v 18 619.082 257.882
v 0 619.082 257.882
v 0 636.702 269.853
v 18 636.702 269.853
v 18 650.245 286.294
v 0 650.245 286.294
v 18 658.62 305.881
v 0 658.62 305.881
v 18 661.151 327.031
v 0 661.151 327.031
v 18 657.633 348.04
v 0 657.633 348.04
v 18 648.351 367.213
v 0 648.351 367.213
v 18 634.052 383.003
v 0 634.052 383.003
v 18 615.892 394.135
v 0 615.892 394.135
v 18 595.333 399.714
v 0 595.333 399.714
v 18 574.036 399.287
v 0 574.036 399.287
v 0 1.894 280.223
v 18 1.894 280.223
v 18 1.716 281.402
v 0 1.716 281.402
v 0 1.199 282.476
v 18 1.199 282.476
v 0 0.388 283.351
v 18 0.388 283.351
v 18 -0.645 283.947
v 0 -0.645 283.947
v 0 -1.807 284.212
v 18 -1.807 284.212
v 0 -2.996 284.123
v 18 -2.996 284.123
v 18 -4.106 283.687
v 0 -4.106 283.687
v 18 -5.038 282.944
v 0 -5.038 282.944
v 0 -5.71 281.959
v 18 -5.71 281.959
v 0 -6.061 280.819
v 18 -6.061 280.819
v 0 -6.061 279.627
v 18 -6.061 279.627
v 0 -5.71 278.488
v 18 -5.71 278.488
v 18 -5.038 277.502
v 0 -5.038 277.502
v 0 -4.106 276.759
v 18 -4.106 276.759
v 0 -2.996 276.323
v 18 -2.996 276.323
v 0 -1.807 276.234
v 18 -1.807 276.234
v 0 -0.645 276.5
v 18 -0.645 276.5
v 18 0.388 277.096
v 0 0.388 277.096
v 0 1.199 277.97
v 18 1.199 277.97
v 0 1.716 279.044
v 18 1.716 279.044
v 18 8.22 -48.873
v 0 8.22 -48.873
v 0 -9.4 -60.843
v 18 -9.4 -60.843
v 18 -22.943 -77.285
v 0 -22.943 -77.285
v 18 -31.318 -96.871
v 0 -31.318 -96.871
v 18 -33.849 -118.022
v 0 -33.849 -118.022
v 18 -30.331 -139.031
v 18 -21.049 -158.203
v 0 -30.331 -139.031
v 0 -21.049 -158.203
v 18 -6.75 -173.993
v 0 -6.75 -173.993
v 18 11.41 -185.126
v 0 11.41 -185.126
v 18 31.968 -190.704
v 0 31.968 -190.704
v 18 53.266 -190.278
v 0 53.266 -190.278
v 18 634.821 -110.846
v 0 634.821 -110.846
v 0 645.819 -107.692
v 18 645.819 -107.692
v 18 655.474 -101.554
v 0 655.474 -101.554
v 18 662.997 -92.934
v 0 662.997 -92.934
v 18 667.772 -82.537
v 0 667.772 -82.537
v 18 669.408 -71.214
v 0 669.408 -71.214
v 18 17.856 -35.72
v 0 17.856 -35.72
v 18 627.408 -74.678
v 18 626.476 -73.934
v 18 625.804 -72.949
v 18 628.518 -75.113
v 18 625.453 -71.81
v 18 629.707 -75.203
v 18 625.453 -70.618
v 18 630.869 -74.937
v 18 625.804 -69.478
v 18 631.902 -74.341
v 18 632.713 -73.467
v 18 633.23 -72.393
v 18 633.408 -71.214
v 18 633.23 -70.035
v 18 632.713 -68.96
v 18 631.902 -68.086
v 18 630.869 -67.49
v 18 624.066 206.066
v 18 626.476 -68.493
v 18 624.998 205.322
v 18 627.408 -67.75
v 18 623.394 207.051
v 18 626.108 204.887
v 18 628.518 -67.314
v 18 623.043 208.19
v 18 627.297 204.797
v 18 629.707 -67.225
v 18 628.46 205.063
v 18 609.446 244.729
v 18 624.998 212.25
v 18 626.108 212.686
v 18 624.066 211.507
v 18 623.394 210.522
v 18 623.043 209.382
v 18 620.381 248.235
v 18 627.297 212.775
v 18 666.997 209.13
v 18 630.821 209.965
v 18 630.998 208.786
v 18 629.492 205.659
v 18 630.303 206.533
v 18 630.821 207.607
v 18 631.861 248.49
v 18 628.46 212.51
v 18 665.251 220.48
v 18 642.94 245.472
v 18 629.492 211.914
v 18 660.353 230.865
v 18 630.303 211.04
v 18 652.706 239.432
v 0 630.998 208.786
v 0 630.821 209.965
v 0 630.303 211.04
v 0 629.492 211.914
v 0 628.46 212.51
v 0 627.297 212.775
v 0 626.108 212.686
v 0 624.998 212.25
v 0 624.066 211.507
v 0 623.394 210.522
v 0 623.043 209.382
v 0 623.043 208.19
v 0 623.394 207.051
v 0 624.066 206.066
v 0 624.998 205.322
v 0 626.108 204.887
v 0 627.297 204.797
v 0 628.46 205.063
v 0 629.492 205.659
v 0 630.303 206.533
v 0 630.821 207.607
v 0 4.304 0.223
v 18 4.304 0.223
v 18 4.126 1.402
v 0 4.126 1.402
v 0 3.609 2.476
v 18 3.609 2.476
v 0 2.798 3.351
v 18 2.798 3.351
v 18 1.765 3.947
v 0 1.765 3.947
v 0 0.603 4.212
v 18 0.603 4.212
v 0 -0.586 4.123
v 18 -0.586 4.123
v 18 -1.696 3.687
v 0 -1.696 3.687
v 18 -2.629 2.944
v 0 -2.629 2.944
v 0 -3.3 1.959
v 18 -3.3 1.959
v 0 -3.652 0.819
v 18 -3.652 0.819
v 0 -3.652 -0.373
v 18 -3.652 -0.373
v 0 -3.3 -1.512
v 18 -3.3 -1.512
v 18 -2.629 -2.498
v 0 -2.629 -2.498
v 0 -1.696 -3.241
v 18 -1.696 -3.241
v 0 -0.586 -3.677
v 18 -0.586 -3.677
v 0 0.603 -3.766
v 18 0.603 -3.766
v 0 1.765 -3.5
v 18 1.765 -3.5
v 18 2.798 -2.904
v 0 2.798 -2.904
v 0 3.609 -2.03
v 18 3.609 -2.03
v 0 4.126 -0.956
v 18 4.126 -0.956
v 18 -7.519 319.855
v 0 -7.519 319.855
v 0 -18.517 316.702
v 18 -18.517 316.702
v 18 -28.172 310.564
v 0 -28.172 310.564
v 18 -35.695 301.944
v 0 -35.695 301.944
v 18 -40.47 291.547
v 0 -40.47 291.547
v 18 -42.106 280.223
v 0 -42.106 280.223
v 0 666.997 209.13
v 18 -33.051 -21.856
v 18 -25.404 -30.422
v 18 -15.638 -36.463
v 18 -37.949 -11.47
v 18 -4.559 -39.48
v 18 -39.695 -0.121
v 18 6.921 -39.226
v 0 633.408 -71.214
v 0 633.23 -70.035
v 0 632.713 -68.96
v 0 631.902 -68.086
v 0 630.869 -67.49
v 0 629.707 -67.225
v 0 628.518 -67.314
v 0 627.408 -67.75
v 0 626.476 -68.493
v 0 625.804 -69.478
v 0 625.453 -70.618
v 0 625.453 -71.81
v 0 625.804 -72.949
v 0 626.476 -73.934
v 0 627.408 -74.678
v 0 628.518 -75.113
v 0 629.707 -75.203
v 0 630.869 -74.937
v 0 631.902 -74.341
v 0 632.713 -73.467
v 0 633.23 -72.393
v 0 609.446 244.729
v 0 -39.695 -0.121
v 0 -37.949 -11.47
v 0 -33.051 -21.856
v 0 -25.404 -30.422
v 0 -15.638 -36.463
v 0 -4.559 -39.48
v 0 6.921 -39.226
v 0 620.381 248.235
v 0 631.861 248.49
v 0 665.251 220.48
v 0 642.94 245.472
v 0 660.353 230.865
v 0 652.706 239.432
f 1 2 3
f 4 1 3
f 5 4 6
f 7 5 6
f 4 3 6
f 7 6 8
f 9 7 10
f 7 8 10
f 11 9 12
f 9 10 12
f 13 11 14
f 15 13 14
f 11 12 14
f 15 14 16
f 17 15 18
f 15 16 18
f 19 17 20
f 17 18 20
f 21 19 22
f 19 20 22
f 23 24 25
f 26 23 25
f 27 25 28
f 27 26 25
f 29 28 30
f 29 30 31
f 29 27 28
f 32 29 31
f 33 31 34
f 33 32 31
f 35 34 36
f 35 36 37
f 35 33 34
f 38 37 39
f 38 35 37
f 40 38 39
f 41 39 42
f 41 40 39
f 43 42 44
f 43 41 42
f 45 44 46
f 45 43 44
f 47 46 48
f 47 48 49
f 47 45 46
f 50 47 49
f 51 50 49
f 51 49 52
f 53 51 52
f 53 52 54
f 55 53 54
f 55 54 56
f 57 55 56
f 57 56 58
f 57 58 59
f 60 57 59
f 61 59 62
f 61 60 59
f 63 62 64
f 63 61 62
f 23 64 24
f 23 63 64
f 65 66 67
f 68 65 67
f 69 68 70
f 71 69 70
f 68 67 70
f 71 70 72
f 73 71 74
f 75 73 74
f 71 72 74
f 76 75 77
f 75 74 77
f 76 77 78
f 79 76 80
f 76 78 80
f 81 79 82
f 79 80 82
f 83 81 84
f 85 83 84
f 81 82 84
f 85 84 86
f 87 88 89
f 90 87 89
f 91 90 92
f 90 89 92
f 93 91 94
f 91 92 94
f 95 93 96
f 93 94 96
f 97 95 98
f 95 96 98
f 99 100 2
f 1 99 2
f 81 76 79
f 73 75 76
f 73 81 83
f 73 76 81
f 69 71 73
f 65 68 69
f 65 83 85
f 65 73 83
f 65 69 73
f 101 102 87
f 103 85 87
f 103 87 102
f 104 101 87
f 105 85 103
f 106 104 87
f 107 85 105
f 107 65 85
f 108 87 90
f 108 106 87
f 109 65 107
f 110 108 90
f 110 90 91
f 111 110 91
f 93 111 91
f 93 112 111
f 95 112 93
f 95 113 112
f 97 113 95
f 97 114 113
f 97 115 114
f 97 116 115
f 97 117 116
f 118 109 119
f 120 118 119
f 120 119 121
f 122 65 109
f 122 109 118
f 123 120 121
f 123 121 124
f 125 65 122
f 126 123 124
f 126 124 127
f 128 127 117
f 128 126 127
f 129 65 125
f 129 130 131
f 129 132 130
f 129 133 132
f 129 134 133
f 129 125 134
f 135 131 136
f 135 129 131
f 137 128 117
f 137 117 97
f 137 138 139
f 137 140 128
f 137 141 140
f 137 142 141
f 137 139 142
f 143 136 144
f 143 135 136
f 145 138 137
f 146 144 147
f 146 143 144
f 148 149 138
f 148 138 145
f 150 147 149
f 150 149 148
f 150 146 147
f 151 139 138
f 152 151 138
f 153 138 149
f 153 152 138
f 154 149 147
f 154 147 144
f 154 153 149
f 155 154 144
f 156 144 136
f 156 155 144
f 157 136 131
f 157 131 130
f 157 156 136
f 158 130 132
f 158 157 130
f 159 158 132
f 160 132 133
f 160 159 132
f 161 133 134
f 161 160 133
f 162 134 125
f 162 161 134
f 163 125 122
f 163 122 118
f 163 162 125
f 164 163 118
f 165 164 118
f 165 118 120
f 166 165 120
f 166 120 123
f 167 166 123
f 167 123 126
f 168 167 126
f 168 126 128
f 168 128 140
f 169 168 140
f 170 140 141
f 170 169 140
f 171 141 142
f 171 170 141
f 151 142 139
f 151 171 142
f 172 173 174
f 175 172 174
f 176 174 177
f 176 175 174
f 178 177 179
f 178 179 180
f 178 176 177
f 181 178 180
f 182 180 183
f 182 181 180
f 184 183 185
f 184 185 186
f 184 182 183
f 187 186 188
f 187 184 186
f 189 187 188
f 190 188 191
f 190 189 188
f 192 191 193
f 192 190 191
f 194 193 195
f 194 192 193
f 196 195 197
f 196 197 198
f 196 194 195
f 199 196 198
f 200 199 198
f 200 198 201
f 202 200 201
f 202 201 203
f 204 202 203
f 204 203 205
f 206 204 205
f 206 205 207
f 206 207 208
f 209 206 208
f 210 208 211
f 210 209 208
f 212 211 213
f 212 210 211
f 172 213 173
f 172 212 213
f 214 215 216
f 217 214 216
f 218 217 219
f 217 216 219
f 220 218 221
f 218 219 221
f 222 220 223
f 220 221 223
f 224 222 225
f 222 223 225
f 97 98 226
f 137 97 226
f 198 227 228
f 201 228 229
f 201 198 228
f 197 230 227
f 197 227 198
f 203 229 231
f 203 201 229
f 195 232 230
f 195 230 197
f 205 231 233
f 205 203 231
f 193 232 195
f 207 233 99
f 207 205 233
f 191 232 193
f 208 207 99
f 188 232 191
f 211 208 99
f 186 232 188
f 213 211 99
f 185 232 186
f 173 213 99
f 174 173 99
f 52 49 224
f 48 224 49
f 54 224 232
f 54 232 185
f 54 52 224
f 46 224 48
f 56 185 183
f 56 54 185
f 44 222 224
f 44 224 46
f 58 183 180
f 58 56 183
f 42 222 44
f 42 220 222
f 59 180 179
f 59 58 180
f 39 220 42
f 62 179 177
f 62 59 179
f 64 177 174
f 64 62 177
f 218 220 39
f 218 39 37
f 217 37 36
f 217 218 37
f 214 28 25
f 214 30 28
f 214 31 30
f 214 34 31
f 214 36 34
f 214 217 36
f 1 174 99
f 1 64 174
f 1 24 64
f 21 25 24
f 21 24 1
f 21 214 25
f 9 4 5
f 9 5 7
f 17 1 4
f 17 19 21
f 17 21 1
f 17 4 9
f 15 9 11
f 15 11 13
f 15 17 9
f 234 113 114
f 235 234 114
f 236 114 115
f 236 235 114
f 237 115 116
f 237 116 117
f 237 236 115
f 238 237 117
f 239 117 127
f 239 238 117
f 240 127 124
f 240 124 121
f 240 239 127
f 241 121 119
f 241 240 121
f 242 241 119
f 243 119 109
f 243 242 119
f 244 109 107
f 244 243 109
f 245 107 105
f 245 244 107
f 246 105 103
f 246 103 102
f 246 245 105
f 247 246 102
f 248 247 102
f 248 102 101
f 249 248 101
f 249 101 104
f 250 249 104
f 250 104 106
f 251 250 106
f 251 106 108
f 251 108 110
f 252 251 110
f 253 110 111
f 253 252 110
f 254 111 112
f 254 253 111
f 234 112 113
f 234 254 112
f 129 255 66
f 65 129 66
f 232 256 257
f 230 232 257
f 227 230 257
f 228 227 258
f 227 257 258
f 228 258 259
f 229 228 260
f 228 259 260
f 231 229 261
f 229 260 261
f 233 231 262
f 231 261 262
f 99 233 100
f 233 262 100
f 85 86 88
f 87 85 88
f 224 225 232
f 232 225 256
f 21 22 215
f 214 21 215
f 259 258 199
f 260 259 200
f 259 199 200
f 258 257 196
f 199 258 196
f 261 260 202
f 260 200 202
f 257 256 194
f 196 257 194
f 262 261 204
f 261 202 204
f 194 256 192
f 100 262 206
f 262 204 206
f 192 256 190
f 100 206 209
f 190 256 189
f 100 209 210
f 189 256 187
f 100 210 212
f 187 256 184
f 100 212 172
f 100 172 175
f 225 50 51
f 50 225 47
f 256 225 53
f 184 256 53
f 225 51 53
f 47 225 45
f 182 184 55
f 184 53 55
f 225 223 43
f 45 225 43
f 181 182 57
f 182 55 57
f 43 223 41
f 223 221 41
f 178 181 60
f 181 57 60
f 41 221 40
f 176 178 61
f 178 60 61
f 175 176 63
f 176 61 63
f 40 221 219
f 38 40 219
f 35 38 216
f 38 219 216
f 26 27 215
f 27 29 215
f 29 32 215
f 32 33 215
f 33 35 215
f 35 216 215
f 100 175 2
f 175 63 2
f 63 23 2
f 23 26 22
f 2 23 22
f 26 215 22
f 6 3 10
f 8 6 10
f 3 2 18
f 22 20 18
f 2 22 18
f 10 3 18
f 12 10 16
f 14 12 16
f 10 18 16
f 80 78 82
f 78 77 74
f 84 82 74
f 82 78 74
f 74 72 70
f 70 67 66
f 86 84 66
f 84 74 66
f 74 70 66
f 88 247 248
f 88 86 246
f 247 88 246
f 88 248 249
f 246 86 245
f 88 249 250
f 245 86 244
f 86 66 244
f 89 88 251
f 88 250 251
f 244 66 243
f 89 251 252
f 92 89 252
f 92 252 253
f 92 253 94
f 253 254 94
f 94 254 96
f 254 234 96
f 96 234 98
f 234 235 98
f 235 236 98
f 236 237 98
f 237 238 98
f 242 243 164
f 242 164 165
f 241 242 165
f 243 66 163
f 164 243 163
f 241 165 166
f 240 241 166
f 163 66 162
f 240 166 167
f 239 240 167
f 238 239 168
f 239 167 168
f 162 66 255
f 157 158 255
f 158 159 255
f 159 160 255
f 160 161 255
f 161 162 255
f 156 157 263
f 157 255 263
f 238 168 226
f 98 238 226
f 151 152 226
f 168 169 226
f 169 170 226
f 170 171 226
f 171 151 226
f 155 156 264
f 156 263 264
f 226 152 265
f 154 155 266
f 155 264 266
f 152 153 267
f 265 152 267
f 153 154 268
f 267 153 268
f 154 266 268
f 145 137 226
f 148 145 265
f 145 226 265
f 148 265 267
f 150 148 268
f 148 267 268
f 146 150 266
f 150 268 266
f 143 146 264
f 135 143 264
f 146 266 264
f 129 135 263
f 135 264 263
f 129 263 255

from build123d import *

# Parameters (mm, degrees)
F0_R     = 4
F1_DEPTH = 18


with BuildPart() as f1:
    # F0 (on Right) → F1 (new body)
    with BuildSketch(Plane.YZ):
        with BuildLine():
            Line((-42.106009, 280.223184), (-39.694908, -0.120823))
            ThreePointArc((-39.694908, -0.120823), (-20.738769, -33.794726), (17.856053, -35.719991))
            Line((17.856053, -35.719991), (619.082214, 257.881955))
            ThreePointArc((619.082214, 257.881955), (657.633017, 348.040201), (574.036223, 399.287149))
            Line((574.036223, 399.287149), (-7.519163, 319.855214))
            ThreePointArc((-7.519163, 319.855214), (-32.243412, 306.524076), (-42.106009, 280.223184))
        make_face()
        with Locations((0.303613, 0.223184)):
            Circle(F0_R, mode=Mode.SUBTRACT)
        with Locations((-2.106009, 280.223184)):
            Circle(F0_R, mode=Mode.SUBTRACT)
        with BuildLine():
            Line((669.407956, -71.213742), (666.996855, 209.130266))
            ThreePointArc((666.996855, 209.130266), (648.040716, 242.804168), (609.445894, 244.729433))
            Line((609.445894, 244.729433), (8.219732, -48.872513))
            ThreePointArc((8.219732, -48.872513), (-30.33107, -139.030759), (53.265724, -190.277707))
            Line((53.265724, -190.277707), (634.82111, -110.845772))
            ThreePointArc((634.82111, -110.845772), (659.545359, -97.514634), (669.407956, -71.213742))
        make_face()
        with Locations((629.407956, -71.213742)):
            Circle(F0_R, mode=Mode.SUBTRACT)
        with Locations((626.998334, 208.786258)):
            Circle(F0_R, mode=Mode.SUBTRACT)
    extrude(amount=F1_DEPTH)


solid = f1.part
